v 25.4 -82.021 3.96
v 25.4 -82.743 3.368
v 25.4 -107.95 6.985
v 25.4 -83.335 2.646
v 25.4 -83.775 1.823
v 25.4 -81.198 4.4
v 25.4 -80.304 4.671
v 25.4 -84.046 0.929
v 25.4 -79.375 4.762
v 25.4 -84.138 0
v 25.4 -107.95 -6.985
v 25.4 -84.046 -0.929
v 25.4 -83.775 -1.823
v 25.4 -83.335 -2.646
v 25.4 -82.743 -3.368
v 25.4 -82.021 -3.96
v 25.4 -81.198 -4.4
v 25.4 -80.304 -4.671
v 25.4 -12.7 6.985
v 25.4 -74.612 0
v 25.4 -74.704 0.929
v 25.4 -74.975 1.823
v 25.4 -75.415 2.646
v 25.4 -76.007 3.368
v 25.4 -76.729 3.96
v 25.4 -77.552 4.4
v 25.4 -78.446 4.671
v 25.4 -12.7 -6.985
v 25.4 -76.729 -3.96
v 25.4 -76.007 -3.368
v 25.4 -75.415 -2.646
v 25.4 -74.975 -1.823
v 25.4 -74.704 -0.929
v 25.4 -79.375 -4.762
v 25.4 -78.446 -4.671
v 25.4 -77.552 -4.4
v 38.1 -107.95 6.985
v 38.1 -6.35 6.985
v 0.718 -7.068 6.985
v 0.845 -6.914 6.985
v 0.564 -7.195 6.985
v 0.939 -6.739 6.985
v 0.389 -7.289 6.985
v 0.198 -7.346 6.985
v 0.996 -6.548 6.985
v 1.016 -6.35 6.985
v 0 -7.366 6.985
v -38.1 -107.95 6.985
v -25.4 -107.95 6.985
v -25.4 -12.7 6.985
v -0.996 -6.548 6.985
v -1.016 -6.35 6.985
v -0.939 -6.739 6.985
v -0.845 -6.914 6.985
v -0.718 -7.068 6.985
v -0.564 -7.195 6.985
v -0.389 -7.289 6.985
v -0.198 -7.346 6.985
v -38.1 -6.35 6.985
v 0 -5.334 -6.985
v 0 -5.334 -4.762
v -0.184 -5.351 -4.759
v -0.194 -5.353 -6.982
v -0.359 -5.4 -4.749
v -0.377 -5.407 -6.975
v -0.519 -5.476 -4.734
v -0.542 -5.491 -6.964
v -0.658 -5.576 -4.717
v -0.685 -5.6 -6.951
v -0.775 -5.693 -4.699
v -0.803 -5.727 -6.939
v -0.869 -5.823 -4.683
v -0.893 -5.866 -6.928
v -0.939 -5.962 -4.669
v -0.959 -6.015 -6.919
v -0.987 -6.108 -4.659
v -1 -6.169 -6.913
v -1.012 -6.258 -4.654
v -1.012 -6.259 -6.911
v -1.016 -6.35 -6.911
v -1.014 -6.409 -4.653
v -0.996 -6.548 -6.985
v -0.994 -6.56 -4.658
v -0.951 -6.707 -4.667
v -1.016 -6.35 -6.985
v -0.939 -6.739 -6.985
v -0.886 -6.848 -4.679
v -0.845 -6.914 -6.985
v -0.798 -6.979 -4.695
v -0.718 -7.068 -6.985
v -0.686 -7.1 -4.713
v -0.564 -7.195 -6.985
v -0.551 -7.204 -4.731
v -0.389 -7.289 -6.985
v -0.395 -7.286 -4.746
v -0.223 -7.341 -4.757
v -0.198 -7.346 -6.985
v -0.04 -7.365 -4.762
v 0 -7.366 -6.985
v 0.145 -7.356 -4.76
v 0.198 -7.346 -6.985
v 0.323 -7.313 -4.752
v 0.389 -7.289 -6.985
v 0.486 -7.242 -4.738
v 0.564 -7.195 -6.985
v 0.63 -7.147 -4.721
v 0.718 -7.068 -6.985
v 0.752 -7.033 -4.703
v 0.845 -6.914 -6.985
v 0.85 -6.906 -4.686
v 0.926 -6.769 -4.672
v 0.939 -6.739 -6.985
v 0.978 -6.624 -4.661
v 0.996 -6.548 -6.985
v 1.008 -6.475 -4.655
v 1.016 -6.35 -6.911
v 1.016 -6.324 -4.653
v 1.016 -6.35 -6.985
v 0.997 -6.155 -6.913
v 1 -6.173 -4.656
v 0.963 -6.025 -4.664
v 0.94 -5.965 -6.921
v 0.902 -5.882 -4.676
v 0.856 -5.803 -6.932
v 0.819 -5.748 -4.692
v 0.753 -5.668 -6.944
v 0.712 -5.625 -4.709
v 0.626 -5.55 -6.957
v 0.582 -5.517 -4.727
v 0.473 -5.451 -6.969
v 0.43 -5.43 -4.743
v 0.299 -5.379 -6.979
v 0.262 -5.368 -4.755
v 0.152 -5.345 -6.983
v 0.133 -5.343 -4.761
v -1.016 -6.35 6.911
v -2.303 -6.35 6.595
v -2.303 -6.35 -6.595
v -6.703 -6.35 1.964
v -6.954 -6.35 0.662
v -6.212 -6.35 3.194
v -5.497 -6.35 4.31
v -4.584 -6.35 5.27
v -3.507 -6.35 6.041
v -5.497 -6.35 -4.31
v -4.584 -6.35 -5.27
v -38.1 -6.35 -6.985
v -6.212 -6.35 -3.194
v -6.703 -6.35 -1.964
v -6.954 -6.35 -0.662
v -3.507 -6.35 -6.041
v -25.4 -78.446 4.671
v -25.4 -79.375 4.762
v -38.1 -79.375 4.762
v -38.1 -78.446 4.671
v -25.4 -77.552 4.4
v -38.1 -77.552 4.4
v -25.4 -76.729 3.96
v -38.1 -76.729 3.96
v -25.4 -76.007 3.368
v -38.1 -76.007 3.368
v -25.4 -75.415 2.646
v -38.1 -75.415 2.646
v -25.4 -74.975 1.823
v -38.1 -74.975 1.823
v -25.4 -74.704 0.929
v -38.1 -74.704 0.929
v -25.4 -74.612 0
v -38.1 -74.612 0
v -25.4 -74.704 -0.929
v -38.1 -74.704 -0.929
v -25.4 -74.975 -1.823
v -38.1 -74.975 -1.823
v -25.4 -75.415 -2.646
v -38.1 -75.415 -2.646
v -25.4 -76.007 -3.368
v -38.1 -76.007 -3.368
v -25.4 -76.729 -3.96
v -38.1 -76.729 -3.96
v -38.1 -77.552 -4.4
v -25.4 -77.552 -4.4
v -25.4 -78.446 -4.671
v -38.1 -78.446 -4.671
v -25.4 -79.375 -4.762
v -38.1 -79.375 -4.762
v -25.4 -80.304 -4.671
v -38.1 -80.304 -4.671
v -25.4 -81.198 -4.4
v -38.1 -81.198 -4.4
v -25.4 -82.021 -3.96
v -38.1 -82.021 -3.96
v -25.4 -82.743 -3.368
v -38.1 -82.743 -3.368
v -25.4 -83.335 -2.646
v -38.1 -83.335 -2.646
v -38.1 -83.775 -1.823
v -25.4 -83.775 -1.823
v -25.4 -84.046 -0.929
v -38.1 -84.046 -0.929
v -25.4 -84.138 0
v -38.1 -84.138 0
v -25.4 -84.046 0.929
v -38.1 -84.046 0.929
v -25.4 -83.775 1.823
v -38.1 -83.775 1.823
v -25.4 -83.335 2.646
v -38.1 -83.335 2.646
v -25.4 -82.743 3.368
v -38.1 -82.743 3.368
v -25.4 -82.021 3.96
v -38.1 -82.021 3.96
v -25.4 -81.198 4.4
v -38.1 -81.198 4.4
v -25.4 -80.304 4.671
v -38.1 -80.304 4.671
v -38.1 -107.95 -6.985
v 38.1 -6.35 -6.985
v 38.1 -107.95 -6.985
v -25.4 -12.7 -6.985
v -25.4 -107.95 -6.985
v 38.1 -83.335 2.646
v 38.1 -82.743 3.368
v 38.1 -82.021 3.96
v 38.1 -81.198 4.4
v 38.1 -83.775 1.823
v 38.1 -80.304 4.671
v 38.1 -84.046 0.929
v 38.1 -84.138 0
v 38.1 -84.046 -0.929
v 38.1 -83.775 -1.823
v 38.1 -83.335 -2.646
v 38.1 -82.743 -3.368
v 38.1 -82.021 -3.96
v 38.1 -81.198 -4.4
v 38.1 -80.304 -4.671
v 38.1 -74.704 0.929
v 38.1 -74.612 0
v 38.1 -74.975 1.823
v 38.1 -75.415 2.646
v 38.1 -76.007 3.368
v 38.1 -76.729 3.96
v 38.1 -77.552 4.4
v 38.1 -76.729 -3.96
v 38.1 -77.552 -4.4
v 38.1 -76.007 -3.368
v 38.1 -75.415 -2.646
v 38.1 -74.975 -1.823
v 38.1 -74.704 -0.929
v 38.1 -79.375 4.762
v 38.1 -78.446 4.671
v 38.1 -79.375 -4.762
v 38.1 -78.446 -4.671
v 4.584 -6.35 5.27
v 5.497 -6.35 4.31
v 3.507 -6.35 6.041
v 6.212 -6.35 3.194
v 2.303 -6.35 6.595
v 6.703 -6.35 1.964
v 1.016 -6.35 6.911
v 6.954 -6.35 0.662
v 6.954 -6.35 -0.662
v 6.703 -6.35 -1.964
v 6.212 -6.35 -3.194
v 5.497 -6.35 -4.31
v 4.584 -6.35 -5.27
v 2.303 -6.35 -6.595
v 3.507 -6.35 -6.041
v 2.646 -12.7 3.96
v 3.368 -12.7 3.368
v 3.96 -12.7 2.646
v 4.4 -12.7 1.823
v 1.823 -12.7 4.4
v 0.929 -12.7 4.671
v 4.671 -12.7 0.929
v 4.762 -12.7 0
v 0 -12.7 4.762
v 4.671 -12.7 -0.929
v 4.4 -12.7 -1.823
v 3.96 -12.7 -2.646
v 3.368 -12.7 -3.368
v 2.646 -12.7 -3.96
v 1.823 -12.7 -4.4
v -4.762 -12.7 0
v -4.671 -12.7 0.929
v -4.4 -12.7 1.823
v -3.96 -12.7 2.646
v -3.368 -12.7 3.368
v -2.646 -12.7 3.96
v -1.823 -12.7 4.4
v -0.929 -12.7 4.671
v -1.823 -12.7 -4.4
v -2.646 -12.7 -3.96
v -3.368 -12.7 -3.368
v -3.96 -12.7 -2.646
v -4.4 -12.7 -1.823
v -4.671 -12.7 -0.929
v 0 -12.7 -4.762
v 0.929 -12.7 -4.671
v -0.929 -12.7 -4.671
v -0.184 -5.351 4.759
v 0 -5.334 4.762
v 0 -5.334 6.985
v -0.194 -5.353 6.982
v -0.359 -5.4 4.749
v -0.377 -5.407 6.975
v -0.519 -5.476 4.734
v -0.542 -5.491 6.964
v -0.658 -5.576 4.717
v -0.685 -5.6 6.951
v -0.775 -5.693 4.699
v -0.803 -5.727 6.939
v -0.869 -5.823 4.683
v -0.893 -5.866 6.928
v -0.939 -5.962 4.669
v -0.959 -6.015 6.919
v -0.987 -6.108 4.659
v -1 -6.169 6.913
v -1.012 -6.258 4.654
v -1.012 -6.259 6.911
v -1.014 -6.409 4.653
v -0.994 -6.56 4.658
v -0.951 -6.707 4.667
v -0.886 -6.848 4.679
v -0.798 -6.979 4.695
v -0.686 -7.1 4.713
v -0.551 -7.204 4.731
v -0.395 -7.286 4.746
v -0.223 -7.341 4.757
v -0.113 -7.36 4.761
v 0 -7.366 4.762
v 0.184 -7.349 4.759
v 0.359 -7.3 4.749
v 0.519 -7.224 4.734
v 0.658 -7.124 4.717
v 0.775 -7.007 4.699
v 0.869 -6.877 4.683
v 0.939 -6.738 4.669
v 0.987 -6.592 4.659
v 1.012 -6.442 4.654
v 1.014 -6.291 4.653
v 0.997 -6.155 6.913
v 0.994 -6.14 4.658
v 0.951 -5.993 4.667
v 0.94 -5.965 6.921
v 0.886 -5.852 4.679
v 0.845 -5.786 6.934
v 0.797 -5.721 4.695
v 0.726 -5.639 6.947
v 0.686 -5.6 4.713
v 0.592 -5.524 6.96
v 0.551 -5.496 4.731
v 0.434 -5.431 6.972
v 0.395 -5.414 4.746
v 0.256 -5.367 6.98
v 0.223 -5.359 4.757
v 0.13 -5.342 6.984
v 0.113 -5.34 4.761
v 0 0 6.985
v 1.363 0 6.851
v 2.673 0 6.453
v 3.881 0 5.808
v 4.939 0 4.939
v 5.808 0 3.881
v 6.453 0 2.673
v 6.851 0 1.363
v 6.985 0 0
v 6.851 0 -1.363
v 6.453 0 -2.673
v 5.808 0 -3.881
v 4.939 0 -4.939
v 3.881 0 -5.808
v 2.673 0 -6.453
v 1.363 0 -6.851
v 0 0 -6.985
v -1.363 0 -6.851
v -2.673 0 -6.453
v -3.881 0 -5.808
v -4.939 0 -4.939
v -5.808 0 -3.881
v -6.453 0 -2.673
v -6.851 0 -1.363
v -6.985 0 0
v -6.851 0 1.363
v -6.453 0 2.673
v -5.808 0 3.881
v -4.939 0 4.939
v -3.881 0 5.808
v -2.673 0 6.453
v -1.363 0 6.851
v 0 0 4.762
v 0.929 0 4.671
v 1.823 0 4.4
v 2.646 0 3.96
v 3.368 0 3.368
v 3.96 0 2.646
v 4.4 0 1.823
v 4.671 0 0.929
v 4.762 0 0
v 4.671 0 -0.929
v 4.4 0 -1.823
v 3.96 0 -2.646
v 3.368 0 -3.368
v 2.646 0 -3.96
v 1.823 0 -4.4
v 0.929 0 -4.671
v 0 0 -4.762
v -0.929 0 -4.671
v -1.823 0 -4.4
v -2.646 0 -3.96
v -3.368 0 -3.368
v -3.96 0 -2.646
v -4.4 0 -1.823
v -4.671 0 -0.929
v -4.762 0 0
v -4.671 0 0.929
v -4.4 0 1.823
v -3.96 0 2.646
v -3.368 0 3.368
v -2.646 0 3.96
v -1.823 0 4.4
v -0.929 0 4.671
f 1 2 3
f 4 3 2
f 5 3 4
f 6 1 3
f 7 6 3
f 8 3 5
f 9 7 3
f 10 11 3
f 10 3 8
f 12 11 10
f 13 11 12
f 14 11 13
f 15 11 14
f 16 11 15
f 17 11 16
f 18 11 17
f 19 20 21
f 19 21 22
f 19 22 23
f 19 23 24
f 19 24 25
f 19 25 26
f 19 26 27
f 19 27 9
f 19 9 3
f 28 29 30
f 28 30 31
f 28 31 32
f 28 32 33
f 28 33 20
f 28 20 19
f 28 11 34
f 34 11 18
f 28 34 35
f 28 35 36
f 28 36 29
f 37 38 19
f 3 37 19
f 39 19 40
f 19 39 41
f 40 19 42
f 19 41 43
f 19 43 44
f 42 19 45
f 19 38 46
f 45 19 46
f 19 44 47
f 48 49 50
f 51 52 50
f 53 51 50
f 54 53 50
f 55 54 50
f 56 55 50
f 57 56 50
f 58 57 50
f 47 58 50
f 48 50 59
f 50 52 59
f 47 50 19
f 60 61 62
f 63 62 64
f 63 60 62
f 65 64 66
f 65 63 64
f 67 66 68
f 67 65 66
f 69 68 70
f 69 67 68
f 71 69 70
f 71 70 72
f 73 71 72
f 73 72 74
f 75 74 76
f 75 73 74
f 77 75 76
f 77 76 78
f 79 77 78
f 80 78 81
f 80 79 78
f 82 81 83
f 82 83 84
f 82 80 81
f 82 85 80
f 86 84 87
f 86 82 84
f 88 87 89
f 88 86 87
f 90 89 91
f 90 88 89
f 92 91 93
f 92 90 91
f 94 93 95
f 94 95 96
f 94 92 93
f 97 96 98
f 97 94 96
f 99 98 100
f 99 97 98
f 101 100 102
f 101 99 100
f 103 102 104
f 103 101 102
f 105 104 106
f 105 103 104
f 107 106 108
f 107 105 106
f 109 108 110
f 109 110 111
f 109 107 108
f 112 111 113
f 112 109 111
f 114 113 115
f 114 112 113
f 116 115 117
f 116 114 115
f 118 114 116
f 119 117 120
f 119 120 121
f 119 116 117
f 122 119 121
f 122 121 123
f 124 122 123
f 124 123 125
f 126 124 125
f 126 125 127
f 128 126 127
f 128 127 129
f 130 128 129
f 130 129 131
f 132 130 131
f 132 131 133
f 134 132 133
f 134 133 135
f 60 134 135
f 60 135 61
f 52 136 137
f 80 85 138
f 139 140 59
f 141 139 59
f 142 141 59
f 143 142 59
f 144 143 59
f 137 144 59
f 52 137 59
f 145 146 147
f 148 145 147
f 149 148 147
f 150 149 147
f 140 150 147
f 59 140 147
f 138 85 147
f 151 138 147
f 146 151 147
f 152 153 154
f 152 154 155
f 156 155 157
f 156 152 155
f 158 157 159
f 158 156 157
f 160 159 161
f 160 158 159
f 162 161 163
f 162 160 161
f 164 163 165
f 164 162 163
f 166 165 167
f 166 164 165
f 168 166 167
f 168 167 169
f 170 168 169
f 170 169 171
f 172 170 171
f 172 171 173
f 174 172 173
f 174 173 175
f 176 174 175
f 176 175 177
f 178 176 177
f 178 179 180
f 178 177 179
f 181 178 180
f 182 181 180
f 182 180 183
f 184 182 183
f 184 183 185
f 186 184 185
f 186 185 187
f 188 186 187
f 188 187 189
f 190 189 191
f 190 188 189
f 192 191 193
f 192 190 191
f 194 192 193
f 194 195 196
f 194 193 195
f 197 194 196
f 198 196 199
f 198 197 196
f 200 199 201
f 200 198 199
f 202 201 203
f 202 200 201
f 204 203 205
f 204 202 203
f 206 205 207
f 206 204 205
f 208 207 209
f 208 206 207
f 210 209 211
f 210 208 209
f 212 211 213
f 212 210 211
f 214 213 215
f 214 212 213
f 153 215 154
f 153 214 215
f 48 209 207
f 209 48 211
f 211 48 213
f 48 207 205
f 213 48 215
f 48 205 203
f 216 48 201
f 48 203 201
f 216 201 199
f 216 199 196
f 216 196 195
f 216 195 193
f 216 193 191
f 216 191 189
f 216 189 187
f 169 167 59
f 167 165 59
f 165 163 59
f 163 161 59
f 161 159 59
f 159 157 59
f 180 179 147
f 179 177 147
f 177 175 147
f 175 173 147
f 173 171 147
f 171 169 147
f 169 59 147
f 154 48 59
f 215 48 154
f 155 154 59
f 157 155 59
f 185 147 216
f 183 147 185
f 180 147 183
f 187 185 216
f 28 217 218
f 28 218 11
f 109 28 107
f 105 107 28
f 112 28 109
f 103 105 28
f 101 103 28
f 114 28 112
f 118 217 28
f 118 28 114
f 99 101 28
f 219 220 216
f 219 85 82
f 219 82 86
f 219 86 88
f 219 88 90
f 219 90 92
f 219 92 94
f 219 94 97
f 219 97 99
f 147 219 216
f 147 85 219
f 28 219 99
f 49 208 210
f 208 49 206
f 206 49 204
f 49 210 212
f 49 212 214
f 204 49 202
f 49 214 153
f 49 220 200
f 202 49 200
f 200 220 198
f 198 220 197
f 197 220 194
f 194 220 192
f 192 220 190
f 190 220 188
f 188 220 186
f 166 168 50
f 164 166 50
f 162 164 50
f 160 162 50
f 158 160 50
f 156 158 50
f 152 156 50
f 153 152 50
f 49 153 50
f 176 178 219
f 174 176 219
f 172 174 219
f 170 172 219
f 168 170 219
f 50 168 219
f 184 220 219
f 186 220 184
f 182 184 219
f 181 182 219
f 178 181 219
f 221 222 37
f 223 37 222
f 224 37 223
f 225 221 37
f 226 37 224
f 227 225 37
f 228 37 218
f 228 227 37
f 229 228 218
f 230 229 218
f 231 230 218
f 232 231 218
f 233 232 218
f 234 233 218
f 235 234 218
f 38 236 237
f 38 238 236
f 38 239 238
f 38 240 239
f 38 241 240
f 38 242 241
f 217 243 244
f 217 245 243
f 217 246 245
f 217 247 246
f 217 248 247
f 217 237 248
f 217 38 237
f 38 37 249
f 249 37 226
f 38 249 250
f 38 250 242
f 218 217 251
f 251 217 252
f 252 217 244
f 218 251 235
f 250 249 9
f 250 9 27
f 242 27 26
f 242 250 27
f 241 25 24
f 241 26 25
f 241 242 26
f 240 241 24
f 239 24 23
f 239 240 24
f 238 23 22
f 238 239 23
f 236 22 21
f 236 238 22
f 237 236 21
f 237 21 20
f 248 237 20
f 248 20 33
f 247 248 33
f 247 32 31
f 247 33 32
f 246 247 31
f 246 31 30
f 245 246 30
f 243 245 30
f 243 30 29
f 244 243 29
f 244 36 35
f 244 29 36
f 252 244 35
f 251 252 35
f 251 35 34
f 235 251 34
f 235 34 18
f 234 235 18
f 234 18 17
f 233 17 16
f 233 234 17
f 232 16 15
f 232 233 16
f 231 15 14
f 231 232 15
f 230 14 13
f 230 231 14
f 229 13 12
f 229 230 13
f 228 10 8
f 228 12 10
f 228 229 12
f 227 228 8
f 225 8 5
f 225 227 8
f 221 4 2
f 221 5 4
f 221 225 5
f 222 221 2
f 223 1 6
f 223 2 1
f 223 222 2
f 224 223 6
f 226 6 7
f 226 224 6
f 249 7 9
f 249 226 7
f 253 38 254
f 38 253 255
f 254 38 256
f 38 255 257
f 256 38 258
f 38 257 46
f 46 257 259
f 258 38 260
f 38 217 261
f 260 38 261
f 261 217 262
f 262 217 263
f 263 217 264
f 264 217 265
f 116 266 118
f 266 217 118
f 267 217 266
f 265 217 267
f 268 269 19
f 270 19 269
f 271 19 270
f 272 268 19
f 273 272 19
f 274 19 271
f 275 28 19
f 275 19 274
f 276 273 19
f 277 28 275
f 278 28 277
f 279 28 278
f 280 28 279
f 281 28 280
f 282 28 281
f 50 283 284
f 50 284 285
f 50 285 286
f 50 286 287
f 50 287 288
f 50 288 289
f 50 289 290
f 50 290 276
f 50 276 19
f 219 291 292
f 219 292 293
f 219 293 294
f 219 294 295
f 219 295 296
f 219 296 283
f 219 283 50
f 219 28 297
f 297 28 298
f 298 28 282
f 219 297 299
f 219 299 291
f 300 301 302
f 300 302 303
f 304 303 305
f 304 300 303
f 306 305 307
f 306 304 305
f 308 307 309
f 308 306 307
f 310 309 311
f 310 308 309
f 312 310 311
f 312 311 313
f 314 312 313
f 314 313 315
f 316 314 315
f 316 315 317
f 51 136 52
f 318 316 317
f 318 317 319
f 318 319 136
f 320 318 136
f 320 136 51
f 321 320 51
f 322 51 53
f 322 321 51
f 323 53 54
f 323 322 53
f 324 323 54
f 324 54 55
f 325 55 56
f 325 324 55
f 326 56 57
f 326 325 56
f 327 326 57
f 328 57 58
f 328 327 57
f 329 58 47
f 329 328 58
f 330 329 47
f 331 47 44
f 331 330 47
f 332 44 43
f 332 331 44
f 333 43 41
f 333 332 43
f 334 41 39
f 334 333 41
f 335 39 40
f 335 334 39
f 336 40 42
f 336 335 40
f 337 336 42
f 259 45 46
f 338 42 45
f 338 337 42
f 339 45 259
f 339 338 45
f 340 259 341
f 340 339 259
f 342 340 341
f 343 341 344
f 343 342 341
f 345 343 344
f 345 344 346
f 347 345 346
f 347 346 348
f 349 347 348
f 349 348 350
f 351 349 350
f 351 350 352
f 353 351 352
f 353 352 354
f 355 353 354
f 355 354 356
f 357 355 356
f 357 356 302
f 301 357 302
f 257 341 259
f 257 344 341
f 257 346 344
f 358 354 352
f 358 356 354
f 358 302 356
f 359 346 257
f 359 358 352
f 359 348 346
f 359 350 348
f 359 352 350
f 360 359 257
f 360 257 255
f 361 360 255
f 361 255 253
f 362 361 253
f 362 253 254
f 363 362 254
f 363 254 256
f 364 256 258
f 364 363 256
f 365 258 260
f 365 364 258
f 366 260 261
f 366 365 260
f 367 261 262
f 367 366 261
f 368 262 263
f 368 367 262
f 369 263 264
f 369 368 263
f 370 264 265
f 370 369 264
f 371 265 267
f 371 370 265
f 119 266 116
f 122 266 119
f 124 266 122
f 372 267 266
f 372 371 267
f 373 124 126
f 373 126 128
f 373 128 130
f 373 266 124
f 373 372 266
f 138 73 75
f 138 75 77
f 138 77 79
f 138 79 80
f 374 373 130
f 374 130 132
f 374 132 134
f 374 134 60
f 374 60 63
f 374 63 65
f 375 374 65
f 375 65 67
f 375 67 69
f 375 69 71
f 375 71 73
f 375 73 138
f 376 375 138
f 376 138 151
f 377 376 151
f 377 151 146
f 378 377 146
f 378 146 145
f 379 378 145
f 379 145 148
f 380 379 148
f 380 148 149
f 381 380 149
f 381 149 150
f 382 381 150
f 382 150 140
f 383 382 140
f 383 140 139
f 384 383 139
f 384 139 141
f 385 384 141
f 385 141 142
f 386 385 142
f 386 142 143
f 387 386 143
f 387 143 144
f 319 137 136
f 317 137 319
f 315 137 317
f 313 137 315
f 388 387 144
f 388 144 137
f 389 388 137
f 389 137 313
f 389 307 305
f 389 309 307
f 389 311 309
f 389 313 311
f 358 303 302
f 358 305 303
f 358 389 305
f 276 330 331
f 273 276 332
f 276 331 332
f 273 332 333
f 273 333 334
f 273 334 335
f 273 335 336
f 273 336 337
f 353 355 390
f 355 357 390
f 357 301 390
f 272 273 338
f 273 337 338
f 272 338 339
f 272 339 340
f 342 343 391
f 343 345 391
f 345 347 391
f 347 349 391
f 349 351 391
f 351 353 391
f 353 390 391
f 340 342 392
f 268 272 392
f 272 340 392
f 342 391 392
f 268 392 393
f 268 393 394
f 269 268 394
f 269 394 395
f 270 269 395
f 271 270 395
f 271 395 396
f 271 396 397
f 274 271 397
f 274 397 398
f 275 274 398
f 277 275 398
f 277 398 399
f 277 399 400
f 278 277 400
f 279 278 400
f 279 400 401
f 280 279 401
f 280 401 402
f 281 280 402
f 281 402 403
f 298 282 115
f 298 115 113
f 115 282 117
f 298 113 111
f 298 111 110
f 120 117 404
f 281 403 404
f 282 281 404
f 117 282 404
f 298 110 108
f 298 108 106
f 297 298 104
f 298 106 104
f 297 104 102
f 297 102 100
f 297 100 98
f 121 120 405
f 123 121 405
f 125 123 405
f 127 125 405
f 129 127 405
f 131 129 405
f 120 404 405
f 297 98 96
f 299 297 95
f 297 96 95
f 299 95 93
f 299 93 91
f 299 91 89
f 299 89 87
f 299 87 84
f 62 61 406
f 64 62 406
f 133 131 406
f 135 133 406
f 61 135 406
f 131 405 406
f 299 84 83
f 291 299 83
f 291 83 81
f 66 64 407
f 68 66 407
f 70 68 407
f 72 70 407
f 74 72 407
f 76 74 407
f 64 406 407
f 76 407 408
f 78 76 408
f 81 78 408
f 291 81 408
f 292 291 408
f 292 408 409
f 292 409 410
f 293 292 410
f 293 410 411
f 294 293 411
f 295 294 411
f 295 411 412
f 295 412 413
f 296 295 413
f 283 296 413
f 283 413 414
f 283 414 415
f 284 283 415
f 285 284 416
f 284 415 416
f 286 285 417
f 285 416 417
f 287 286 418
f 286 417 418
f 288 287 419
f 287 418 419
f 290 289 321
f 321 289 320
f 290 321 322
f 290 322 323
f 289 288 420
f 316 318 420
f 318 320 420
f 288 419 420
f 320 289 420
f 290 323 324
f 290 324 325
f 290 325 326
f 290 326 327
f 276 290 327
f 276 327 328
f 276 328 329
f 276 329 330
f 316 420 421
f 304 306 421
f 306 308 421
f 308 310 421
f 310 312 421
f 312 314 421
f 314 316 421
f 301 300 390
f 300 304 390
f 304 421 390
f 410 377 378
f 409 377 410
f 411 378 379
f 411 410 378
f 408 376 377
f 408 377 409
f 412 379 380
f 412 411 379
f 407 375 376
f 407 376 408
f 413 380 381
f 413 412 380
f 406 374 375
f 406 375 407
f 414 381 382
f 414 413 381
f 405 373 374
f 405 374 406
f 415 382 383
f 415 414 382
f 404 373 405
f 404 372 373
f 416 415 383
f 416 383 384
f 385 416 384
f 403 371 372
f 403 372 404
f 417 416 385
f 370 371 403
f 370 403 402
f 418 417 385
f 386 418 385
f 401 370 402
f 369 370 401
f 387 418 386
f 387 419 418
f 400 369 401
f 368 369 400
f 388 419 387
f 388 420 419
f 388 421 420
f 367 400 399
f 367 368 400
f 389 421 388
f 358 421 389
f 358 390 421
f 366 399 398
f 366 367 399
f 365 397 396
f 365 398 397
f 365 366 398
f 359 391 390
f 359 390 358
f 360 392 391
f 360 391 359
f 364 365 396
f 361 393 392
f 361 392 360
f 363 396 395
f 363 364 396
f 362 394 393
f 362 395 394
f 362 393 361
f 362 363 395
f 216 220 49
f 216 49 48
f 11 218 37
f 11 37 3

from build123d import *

# Parameters (mm, degrees)
SKETCH1_R               = 6.985
BOSS_EXTRUDE1_DEPTH     = 6.35
SKETCH3_R               = 4.7625
CUT_EXTRUDE1_DEPTH      = 63.5
SKETCH5_W               = 76.2
SKETCH5_H               = 13.97
BOSS_EXTRUDE2_DEPTH     = 101.6
SKETCH6_W               = 50.8
SKETCH6_H               = 95.25
CUT_EXTRUDE2_DEPTH      = 116.325510621
SKETCH7_R               = 4.7625
CUT_EXTRUDE3_DEPTH      = 115.689156964
CUT_EXTRUDE4_DEPTH      = 126.436209784
CUT_EXTRUDE4_DEPTH_BACK = 19.05
SKETCH8_R               = 4.7625
CUT_EXTRUDE5_START      = -13.97
SKETCH9_R               = 1.016
CUT_EXTRUDE5_DEPTH      = 13.97


with BuildPart() as part:
    # Sketch1 → Boss-Extrude1 (new body)
    with BuildSketch(Plane(origin=(0, 0, 0), x_dir=(1, 0, 0), z_dir=(0, 1, 0))):
        with Locations(Location((0, 0, 0), (0, 0, 270))):
            Circle(SKETCH1_R)
    extrude(amount=-BOSS_EXTRUDE1_DEPTH)

    # Sketch3 → Cut-Extrude1 (cut)
    with BuildSketch(Plane(origin=(0, 0, 0), x_dir=(1, 0, 0), z_dir=(0, 1, 0))):
        with Locations(Location((0, 0, 0), (0, 0, 270))):
            Circle(SKETCH3_R)
    extrude(amount=-CUT_EXTRUDE1_DEPTH, mode=Mode.SUBTRACT)

    # Sketch5 → Boss-Extrude2 (add)
    with BuildSketch(Plane(origin=(0, -6.35, 0), x_dir=(-1, 0, 0), z_dir=(0, -1, 0))):
        Rectangle(SKETCH5_W, SKETCH5_H)
    extrude(amount=BOSS_EXTRUDE2_DEPTH)

    # Sketch6 → Cut-Extrude2 (cut, through all)
    with BuildSketch(Plane(origin=(0, 0, -6.985), x_dir=(-1, 0, 0), z_dir=(0, 0, -1))):
        with Locations((0, -60.325)):
            Rectangle(SKETCH6_W, SKETCH6_H)
    extrude(amount=-CUT_EXTRUDE2_DEPTH, mode=Mode.SUBTRACT)

    # Sketch7 → Cut-Extrude3 (cut, through all)
    with BuildSketch(Plane(origin=(0, 0, 0), x_dir=(1, 0, 0), z_dir=(0, 1, 0))):
        with Locations(Location((0, 0, 0), (0, 0, 270))):
            Circle(SKETCH7_R)
    extrude(amount=-CUT_EXTRUDE3_DEPTH, mode=Mode.SUBTRACT)

    # Sketch8 → Cut-Extrude4 (cut, two sides: drawn at the far end of the back side and taken through both)
    with BuildSketch(Plane.ZY.offset(-25.4).offset(-CUT_EXTRUDE4_DEPTH_BACK)):
        with Locations((0, -79.375)):
            Circle(SKETCH8_R)
    extrude(amount=CUT_EXTRUDE4_DEPTH + CUT_EXTRUDE4_DEPTH_BACK, mode=Mode.SUBTRACT)

    # Sketch9 → Cut-Extrude5 (cut)
    with BuildSketch(Plane.XY.offset(6.985).offset(CUT_EXTRUDE5_START)):
        with Locations(Location((0, -6.35, 0), (0, 0, 90))):
            Circle(SKETCH9_R)
    extrude(amount=CUT_EXTRUDE5_DEPTH, mode=Mode.SUBTRACT)


solid = part.part
